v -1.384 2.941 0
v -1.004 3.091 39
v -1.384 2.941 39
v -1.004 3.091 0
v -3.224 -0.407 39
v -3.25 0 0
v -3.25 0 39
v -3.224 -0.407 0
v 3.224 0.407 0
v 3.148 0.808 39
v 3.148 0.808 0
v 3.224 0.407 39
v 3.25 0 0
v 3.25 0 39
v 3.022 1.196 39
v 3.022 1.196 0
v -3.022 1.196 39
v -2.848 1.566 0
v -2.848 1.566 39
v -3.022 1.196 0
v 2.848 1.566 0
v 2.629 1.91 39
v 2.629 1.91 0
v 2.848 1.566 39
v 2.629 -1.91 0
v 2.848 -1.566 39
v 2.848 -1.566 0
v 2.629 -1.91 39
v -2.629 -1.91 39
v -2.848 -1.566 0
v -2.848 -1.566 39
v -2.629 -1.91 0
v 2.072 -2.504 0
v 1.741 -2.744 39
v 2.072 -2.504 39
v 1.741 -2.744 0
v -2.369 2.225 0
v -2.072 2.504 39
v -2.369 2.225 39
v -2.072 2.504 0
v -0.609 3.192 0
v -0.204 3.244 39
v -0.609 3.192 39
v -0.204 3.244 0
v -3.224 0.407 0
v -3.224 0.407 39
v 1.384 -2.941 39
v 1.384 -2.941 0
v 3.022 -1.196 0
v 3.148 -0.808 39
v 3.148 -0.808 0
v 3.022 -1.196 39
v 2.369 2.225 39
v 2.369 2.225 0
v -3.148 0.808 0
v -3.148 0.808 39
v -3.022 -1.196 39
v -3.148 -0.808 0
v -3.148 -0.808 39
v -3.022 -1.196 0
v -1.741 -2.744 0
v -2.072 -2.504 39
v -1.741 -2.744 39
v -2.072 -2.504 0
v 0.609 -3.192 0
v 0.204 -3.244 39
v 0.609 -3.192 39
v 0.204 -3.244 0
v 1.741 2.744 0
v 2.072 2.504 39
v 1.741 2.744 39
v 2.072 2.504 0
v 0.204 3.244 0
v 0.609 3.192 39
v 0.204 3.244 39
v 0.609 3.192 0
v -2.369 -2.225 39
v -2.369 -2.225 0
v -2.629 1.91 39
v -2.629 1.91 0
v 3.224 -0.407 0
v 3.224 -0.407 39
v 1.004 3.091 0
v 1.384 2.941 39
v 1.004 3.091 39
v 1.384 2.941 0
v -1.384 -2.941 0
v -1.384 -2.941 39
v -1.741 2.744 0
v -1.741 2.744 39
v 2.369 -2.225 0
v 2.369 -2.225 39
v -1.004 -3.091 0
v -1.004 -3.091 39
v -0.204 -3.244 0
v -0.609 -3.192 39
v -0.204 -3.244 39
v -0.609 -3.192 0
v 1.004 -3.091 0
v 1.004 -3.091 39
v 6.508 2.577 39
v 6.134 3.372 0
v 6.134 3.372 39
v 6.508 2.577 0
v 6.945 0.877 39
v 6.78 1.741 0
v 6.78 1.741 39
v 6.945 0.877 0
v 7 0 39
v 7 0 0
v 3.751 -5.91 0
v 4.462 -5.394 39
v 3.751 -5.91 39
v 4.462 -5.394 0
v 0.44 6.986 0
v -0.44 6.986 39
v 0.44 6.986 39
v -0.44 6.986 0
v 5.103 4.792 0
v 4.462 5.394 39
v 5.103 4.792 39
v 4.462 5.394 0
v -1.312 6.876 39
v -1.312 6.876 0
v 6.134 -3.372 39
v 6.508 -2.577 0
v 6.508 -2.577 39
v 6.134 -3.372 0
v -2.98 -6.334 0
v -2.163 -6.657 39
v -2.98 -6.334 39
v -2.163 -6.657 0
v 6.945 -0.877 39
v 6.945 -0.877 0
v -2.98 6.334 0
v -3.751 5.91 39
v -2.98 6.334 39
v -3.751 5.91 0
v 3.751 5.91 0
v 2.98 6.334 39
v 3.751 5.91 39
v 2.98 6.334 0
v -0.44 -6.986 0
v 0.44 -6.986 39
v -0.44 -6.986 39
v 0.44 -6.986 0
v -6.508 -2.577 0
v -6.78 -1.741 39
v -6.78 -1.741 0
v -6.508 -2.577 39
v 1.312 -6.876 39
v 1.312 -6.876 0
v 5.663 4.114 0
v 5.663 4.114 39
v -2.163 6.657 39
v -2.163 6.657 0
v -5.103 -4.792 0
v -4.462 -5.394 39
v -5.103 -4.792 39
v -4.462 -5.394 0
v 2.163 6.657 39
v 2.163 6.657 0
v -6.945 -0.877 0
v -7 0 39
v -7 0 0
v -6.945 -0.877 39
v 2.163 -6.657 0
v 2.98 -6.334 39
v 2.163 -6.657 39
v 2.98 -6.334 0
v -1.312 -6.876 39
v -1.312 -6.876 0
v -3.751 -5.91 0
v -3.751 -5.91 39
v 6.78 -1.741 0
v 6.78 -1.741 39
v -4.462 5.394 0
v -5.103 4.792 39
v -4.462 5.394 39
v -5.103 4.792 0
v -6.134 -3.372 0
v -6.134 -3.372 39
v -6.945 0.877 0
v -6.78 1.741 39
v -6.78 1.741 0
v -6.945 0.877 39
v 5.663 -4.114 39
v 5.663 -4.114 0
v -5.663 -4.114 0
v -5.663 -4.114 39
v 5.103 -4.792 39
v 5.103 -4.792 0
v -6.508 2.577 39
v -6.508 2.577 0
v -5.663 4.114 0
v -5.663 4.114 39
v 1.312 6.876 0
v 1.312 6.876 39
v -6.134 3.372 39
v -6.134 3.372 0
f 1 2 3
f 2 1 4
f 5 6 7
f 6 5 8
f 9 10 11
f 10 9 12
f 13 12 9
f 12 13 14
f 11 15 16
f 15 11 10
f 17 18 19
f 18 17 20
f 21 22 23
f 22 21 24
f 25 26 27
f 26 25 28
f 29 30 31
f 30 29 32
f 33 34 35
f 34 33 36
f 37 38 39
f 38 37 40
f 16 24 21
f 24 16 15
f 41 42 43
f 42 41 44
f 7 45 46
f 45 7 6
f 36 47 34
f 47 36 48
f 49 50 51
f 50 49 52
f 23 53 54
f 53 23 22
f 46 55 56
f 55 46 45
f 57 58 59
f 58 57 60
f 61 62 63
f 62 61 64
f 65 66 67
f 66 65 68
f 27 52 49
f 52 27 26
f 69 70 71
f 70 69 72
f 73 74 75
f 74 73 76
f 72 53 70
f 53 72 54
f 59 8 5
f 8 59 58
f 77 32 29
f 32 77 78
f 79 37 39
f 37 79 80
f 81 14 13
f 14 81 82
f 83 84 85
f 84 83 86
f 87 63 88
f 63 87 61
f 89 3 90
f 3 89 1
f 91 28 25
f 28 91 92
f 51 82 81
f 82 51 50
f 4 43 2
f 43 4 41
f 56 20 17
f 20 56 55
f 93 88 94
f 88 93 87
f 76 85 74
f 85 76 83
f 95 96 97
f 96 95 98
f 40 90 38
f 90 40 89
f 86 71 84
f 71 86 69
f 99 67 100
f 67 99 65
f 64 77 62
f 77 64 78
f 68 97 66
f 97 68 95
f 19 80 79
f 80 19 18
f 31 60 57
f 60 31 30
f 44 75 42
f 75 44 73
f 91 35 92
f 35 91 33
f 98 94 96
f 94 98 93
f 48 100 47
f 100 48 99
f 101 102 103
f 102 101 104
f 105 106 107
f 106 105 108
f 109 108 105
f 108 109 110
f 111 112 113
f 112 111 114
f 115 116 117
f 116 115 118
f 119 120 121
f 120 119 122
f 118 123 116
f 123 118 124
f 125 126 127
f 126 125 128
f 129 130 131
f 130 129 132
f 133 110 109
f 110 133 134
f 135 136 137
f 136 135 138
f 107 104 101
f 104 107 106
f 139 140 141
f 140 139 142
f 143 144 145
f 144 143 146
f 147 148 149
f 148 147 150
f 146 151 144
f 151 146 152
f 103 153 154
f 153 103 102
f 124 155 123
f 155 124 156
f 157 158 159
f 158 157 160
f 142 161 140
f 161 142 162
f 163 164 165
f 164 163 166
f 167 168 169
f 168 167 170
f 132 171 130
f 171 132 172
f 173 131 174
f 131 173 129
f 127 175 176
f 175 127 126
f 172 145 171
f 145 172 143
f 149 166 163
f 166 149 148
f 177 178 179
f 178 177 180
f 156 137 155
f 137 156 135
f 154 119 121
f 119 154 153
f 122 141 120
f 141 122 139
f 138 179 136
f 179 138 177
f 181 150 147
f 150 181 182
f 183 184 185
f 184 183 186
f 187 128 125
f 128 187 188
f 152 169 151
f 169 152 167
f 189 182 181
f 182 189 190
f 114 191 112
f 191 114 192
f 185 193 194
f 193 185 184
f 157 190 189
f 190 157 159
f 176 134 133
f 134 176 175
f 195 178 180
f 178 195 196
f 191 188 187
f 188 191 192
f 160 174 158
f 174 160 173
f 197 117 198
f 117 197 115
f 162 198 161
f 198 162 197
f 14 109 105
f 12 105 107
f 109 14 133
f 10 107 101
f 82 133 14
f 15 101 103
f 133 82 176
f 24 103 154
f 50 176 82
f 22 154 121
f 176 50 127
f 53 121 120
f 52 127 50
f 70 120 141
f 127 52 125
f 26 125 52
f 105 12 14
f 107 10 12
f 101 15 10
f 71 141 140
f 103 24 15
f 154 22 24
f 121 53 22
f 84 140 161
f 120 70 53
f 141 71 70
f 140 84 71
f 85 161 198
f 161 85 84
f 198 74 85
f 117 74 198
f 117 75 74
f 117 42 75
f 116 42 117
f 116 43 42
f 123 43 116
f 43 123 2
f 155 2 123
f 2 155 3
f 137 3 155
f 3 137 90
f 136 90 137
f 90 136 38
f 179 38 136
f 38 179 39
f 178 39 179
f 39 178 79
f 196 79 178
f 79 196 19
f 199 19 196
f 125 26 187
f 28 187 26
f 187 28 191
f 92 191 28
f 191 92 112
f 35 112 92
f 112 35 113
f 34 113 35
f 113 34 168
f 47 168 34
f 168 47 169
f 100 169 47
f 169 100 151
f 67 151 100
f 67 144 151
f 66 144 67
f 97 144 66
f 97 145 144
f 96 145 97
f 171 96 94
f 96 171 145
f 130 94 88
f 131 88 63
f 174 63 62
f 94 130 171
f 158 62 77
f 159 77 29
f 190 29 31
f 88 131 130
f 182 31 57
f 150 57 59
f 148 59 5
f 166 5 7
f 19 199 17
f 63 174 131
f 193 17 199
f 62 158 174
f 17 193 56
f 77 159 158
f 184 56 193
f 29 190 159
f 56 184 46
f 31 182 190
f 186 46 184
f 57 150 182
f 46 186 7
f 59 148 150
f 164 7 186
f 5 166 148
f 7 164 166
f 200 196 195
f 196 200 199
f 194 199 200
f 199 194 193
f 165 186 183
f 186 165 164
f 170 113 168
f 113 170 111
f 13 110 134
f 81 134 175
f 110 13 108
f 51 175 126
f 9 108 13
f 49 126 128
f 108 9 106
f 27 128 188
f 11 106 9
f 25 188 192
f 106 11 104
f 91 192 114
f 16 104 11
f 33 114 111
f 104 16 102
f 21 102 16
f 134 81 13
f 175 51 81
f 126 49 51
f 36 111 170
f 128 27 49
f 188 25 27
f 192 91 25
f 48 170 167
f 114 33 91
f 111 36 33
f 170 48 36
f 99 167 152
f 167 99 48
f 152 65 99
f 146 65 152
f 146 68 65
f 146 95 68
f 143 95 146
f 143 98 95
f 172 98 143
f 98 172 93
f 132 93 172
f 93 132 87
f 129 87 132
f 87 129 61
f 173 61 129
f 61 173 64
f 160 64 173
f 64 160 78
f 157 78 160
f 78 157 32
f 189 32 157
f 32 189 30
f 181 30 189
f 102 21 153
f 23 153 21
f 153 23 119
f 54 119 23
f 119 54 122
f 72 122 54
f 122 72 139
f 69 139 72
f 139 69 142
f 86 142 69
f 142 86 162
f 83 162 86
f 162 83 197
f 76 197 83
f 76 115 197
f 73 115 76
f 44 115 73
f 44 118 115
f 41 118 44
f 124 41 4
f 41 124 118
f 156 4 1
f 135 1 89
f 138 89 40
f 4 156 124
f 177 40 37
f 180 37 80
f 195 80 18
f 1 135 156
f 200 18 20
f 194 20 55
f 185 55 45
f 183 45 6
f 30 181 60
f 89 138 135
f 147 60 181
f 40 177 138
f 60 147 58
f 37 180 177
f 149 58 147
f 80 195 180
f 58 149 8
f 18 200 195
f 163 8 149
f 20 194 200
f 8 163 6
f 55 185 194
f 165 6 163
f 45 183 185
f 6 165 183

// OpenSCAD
$fn = 50;


difference() {
	union() {
		*color(alpha = 1.0000000000, c = "gray") {
			translate(v = [0, 7, 0]) {
				linear_extrude(height = 1) {
					text(font = "Arial:style=Bold", halign = "center", size = 4.5000000000, text = "COMMENT plate main", valign = "center");
				}
			}
		}
		cylinder(h = 39, r = 7.0000000000);
	}
	union() {
		*color(alpha = 1.0000000000, c = "gray") {
			translate(v = [0, 7, 0]) {
				linear_extrude(height = 1) {
					text(font = "Arial:style=Bold", halign = "center", size = 4.5000000000, text = "COMMENT holes main", valign = "center");
				}
			}
		}
		translate(v = [0, 0, -100]) {
			cylinder(h = 200, r = 3.2500000000);
		}
		translate(v = [0, 0, -100]) {
			cylinder(h = 200, r = 1.8000000000);
		}
	}
}
